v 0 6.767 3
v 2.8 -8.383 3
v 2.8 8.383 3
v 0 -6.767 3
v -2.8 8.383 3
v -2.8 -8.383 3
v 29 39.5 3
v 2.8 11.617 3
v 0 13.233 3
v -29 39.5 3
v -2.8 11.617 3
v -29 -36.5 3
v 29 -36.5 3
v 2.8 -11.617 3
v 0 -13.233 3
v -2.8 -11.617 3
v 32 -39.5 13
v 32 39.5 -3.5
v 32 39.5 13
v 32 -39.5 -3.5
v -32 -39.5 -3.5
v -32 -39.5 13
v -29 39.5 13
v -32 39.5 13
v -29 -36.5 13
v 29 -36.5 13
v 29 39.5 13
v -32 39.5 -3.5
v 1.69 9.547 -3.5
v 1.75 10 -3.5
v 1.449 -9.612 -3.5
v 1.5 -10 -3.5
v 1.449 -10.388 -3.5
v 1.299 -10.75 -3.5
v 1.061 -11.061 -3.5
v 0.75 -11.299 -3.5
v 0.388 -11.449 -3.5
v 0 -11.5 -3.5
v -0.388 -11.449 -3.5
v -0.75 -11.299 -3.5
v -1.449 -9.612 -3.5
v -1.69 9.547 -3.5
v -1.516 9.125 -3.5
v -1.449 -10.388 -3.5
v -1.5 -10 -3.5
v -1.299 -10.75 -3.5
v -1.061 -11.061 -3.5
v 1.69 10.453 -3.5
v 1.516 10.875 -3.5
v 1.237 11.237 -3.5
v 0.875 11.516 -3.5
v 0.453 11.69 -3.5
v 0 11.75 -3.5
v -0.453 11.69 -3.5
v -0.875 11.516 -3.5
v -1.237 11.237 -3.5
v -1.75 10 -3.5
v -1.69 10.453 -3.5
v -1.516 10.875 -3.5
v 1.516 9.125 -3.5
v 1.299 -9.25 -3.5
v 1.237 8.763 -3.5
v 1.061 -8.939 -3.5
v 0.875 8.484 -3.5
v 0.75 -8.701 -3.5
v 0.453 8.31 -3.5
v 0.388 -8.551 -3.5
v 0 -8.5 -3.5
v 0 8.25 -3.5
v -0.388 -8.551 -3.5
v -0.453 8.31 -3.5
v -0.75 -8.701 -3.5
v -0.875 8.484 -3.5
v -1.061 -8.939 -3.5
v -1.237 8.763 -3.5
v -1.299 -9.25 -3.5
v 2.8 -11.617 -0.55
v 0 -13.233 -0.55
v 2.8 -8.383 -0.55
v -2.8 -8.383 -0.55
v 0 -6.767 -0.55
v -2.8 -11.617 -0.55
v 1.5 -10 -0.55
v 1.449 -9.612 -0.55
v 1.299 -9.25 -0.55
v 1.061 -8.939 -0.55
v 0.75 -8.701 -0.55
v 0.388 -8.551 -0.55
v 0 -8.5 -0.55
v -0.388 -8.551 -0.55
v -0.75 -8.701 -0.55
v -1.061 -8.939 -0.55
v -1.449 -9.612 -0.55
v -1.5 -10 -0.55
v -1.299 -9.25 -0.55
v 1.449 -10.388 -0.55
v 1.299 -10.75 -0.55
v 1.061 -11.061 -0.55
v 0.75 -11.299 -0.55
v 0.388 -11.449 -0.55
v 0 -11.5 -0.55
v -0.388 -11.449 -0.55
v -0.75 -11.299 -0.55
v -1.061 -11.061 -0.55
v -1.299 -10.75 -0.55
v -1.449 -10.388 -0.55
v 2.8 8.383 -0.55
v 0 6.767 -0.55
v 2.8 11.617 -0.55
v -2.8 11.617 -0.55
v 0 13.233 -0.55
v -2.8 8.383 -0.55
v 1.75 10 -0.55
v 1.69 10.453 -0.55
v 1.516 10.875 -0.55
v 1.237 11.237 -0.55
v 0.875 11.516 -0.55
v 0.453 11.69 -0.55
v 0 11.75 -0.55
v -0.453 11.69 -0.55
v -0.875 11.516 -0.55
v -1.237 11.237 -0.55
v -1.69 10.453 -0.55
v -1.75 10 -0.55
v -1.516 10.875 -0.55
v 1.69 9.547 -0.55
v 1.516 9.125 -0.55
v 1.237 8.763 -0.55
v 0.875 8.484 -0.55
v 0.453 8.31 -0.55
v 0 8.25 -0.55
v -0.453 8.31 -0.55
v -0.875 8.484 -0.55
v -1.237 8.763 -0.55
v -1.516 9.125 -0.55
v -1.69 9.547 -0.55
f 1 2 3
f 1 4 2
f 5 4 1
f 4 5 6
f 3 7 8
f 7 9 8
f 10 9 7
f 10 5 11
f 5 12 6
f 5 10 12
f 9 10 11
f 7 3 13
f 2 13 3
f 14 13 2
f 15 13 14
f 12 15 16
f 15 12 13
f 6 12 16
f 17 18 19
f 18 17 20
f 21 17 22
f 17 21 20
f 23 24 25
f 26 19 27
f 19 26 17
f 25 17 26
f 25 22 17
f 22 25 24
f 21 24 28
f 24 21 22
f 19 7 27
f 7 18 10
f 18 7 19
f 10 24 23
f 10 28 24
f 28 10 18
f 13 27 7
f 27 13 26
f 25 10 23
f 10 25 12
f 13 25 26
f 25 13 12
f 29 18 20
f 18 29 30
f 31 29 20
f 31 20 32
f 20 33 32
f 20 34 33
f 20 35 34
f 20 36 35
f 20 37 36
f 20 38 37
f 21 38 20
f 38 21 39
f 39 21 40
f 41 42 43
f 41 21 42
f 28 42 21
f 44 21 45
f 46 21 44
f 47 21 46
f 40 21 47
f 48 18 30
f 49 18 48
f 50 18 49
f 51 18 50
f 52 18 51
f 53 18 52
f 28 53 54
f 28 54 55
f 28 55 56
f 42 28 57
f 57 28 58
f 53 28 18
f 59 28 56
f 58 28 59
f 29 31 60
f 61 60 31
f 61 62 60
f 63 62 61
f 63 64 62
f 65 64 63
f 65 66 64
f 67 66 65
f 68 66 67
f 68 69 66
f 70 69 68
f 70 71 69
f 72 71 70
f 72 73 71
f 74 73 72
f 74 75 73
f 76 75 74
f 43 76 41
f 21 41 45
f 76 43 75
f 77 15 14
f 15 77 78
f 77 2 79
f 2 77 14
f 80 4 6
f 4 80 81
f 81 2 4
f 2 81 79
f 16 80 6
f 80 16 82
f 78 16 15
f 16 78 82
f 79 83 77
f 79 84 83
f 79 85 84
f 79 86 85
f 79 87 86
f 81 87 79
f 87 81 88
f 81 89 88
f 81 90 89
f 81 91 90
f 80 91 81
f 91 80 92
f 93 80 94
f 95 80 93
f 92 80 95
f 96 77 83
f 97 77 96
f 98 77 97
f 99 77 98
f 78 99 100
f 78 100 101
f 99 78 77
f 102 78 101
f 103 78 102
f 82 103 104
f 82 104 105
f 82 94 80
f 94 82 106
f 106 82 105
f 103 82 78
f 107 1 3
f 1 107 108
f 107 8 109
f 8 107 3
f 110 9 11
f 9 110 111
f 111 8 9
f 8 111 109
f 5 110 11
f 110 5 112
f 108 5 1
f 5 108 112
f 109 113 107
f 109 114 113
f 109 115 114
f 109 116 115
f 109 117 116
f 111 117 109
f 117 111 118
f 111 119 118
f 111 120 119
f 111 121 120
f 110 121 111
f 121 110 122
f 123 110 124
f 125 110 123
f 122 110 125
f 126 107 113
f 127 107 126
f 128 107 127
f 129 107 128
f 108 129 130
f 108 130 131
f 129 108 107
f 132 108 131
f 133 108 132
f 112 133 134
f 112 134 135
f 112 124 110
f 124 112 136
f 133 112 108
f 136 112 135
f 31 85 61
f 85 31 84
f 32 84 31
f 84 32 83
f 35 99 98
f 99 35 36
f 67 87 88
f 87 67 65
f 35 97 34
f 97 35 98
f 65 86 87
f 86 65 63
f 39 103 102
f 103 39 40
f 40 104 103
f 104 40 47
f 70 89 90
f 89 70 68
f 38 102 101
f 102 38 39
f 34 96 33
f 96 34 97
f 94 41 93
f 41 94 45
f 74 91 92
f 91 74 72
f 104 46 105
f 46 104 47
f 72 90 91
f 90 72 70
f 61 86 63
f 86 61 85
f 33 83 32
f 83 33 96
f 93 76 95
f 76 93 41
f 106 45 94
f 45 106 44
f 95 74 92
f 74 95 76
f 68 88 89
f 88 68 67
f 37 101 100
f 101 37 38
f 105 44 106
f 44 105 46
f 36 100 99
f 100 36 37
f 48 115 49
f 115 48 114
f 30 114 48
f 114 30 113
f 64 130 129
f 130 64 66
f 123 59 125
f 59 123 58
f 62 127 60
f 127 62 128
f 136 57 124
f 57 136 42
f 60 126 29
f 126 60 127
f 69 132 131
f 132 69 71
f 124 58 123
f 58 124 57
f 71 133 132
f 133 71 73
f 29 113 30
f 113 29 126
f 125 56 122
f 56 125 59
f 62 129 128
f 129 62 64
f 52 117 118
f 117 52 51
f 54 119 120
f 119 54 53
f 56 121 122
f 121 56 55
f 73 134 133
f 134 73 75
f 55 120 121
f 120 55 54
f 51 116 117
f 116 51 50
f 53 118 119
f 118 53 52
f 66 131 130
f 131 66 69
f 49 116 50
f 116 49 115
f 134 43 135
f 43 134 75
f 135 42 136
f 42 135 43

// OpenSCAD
// Reverse-engineered, print-ready holders from the legacy STL envelopes.
// Build one part with: openscad -D 'part="battery_mount_eu"' holders.scad

part = "battery_mount_eu";
$fn = 48;
eps = 0.05;

module m3_holes(points, r = 1.7, h = 30) {
    for (point = points)
        translate([point[0], point[1], -eps]) cylinder(r = r, h = h);
}

// A round mounting lug joined to the neighbouring rail.  Keeping this 2D
// lets the power-bank and USB holders share exactly the same construction.
module tab_2d(point, rail_x, side, r = 3.7) {
    translate(point) circle(r = r);
    if (side == "left")
        translate([point[0], point[1] - r]) square([rail_x - point[0], 2 * r]);
    else
        translate([rail_x, point[1] - r]) square([point[0] - rail_x, 2 * r]);
}

module through_frame(origin, outer, opening_origin, opening, h, tabs = [], side = "left", tab_r = 3.7, hole_r = 1.7) {
    difference() {
        linear_extrude(height = h)
            union() {
                translate(origin) square(outer);
                for (point = tabs)
                    tab_2d(point, side == "left" ? origin[0] : origin[0] + outer[0], side, tab_r);
            }
        translate([opening_origin[0], opening_origin[1], -eps]) cube([opening[0], opening[1], h + 2 * eps]);
        m3_holes(tabs, hole_r, h + 2 * eps);
    }
}

module inverted_tray(origin, outer, opening_origin, opening, roof) {
    difference() {
        translate(origin) cube(outer);
        translate([opening_origin[0], opening_origin[1], -eps])
            cube([opening[0], opening[1], outer[2] - roof + eps]);
    }
}

// Extrude an X/Z section across Y, which is how the wired cable clip is made.
module extrude_y(depth) {
    translate([0, depth, 0]) rotate([90, 0, 0]) linear_extrude(height = depth) children();
}

module battery_mount_eu() {
    difference() {
        union() {
            // The original is a 6.5 mm plate below a 10 mm open U-wall.
            translate([-32, -39.5, -3.5]) cube([64, 79, 6.5]);
            translate([0, 0, 3])
                through_frame([-32, -39.5], [64, 79], [-29, -36.5], [58, 76], 10, [], "left", 0, 0);
        }
        // The legacy print deliberately has asymmetric lower M3 bores.
        translate([0, -10, -3.5 - eps]) cylinder(r = 1.5, h = 3 + 2 * eps, $fn = 24);
        translate([0, 10, -3.5 - eps]) cylinder(r = 1.75, h = 3 + 2 * eps, $fn = 24);
        // Both bores open into 5.6 mm-flat hex-nut pockets at z = -0.5 mm.
        for (y = [-10, 10])
            translate([0, y, -0.5 - eps]) rotate([0, 0, 30])
                cylinder(r = 3.2331615, h = 3.5 + 2 * eps, $fn = 6);
    }
}

module power_bank_holder_5v() {
    // 52.5 x 153 mm clearance, two M3 lugs 100 mm apart.
    through_frame([-4, -4], [60.5, 161], [0, 0], [52.5, 153], 7,
                  [[-7.5, 26.5], [-7.5, 126.5]]);
}

module cable_holder() {
    // This is the original clip's X/Z section, extracted from its planar side
    // face.  Keeping a contour rather than a triangle mesh leaves the part
    // editable while retaining its non-circular cable channel.
    profile = [
        [31.970402, 0.941858], [32, 0], [23.5, 0], [23.5, 1.5],
        [23.471178, 1.792635], [23.385818, 2.074025], [23.247204, 2.333355],
        [23.060659, 2.560660], [22.833355, 2.747204], [22.574024, 2.885819],
        [22.292635, 2.971178], [22, 3], [21.707365, 2.971178],
        [21.425976, 2.885819], [21.166645, 2.747204], [20.939341, 2.560660],
        [20.752796, 2.333355], [20.614182, 2.074025], [20.528822, 1.792635],
        [20.5, 1.5], [20.5, 0], [14, 0], [14, 4], [13.968459, 4.501333],
        [13.874332, 4.994760], [13.719106, 5.472498], [13.505227, 5.927015],
        [13.236068, 6.351141], [12.915874, 6.738188], [12.549696, 7.082053],
        [12.143307, 7.377312], [11.703117, 7.619308], [11.236068, 7.804226],
        [10.749525, 7.929149], [10.251163, 7.992107], [9.748837, 7.992107],
        [9.250475, 7.929149], [8.763932, 7.804226], [8.296883, 7.619308],
        [7.856693, 7.377312], [7.450304, 7.082053], [7.084126, 6.738188],
        [6.763932, 6.351141], [6.494773, 5.927015], [6.280894, 5.472498],
        [6.125668, 4.994760], [6.031541, 4.501333], [6, 4], [6, 0], [0, 0],
        [0.029599, 0.941858], [0.118279, 1.879998], [0.265691, 2.810720],
        [0.471253, 3.730348], [0.734152, 4.635255], [1.053353, 5.521868],
        [1.427594, 6.386689], [1.855400, 7.226305], [2.335081, 8.037402],
        [2.864745, 8.816779], [3.442301, 9.561359], [4.065471, 10.268207],
        [4.731793, 10.934529], [5.438640, 11.557698], [6.183221, 12.135255],
        [6.962598, 12.664919], [7.773695, 13.144600], [8.613311, 13.572406],
        [9.478131, 13.946648], [10.364745, 14.265848], [11.269651, 14.528748],
        [12.189281, 14.734309], [13.120002, 14.881721], [14.058143, 14.970401],
        [15, 15], [17, 15], [17.941858, 14.970401], [18.879999, 14.881721],
        [19.810720, 14.734309], [20.730349, 14.528748], [21.635256, 14.265848],
        [22.521868, 13.946648], [23.386690, 13.572406], [24.226305, 13.144600],
        [25.037401, 12.664919], [25.816778, 12.135255], [26.561359, 11.557698],
        [27.268206, 10.934529], [27.934530, 10.268207], [28.557699, 9.561359],
        [29.135256, 8.816779], [29.664919, 8.037402], [30.144600, 7.226305],
        [30.572405, 6.386689], [30.946648, 5.521868], [31.265848, 4.635255],
        [31.528748, 3.730348], [31.734308, 2.810720], [31.881720, 1.879998]
    ];
    difference() {
        union() {
            extrude_y(7.5) polygon(points = profile);
            linear_extrude(height = 4)
                union() {
                    square([6, 7.5]);
                    tab_2d([-4, 3.75], 0, "left", 3.6);
                    translate([23.5, 0]) square([8.5, 7.5]);
                    tab_2d([36, 3.75], 32, "right", 3.6);
                }
        }
        m3_holes([[-4, 3.75], [36, 3.75]], 1.6, 4 + 2 * eps);
    }
}

module usb_connector_case() {
    tabs = [[-6, 31], [34, 31], [-6, 111], [34, 111]];
    port = [
        [11.5, 0], [11.5, 3.550510], [11.019399, 4.165329],
        [10.686972, 4.871354], [10.519243, 5.633486], [10.524552, 6.413839],
        [10.702635, 7.173619], [11.044638, 7.875055], [11.533559, 8.483278],
        [12.145094, 8.968050], [12.848841, 9.305273], [13.609815, 9.478183],
        [14.390185, 9.478183], [15.151159, 9.305273], [15.854906, 8.968050],
        [16.466440, 8.483278], [16.955362, 7.875055], [17.297365, 7.173619],
        [17.475449, 6.413839], [17.480757, 5.633486], [17.313028, 4.871354],
        [16.980600, 4.165329], [16.5, 3.550510], [16.5, 0]
    ];
    difference() {
        union() {
            // The v1 shell opens downward: 4 mm side rails, a 4 mm roof,
            // and 4 mm closed end caps around a 28 x 122 mm connector bay.
            inverted_tray([-4, -4, 0], [36, 130, 16], [0, 0], [28, 122], 4);
            linear_extrude(height = 4)
                union() {
                    for (tab = [[-6, 31], [-6, 111]]) tab_2d(tab, -4, "left", 3.7);
                    for (tab = [[34, 31], [34, 111]]) tab_2d(tab, 32, "right", 3.7);
                }
            // The central length is an L-channel, not a full U-channel.
            translate([28, 35, 12]) cube([4, 72, 4]);
        }
        m3_holes(tabs, 1.7, 4 + 2 * eps);
        translate([28, 35, -eps]) cube([4, 72, 12 + eps]);
        // The front end cap has a 5 mm lead-in that opens into the USB bulb.
        translate([0, -4 - eps, 0]) extrude_y(4 + 2 * eps) polygon(points = port);
        // Mount lugs are relieved above their 4 mm plate so they do not trap
        // the cable case walls.
        for (tab = tabs)
            translate([tab[0], tab[1], 4 - eps]) cylinder(r = 3, h = 12 + 2 * eps);
    }
}

if (part == "battery_mount_eu")
    battery_mount_eu();
else if (part == "5v_power_bank_holder")
    power_bank_holder_5v();
else if (part == "cable_holder_v0")
    cable_holder();
else if (part == "usb_connector_case_v1")
    usb_connector_case();
else
    assert(false, str("Unknown part: ", part));
